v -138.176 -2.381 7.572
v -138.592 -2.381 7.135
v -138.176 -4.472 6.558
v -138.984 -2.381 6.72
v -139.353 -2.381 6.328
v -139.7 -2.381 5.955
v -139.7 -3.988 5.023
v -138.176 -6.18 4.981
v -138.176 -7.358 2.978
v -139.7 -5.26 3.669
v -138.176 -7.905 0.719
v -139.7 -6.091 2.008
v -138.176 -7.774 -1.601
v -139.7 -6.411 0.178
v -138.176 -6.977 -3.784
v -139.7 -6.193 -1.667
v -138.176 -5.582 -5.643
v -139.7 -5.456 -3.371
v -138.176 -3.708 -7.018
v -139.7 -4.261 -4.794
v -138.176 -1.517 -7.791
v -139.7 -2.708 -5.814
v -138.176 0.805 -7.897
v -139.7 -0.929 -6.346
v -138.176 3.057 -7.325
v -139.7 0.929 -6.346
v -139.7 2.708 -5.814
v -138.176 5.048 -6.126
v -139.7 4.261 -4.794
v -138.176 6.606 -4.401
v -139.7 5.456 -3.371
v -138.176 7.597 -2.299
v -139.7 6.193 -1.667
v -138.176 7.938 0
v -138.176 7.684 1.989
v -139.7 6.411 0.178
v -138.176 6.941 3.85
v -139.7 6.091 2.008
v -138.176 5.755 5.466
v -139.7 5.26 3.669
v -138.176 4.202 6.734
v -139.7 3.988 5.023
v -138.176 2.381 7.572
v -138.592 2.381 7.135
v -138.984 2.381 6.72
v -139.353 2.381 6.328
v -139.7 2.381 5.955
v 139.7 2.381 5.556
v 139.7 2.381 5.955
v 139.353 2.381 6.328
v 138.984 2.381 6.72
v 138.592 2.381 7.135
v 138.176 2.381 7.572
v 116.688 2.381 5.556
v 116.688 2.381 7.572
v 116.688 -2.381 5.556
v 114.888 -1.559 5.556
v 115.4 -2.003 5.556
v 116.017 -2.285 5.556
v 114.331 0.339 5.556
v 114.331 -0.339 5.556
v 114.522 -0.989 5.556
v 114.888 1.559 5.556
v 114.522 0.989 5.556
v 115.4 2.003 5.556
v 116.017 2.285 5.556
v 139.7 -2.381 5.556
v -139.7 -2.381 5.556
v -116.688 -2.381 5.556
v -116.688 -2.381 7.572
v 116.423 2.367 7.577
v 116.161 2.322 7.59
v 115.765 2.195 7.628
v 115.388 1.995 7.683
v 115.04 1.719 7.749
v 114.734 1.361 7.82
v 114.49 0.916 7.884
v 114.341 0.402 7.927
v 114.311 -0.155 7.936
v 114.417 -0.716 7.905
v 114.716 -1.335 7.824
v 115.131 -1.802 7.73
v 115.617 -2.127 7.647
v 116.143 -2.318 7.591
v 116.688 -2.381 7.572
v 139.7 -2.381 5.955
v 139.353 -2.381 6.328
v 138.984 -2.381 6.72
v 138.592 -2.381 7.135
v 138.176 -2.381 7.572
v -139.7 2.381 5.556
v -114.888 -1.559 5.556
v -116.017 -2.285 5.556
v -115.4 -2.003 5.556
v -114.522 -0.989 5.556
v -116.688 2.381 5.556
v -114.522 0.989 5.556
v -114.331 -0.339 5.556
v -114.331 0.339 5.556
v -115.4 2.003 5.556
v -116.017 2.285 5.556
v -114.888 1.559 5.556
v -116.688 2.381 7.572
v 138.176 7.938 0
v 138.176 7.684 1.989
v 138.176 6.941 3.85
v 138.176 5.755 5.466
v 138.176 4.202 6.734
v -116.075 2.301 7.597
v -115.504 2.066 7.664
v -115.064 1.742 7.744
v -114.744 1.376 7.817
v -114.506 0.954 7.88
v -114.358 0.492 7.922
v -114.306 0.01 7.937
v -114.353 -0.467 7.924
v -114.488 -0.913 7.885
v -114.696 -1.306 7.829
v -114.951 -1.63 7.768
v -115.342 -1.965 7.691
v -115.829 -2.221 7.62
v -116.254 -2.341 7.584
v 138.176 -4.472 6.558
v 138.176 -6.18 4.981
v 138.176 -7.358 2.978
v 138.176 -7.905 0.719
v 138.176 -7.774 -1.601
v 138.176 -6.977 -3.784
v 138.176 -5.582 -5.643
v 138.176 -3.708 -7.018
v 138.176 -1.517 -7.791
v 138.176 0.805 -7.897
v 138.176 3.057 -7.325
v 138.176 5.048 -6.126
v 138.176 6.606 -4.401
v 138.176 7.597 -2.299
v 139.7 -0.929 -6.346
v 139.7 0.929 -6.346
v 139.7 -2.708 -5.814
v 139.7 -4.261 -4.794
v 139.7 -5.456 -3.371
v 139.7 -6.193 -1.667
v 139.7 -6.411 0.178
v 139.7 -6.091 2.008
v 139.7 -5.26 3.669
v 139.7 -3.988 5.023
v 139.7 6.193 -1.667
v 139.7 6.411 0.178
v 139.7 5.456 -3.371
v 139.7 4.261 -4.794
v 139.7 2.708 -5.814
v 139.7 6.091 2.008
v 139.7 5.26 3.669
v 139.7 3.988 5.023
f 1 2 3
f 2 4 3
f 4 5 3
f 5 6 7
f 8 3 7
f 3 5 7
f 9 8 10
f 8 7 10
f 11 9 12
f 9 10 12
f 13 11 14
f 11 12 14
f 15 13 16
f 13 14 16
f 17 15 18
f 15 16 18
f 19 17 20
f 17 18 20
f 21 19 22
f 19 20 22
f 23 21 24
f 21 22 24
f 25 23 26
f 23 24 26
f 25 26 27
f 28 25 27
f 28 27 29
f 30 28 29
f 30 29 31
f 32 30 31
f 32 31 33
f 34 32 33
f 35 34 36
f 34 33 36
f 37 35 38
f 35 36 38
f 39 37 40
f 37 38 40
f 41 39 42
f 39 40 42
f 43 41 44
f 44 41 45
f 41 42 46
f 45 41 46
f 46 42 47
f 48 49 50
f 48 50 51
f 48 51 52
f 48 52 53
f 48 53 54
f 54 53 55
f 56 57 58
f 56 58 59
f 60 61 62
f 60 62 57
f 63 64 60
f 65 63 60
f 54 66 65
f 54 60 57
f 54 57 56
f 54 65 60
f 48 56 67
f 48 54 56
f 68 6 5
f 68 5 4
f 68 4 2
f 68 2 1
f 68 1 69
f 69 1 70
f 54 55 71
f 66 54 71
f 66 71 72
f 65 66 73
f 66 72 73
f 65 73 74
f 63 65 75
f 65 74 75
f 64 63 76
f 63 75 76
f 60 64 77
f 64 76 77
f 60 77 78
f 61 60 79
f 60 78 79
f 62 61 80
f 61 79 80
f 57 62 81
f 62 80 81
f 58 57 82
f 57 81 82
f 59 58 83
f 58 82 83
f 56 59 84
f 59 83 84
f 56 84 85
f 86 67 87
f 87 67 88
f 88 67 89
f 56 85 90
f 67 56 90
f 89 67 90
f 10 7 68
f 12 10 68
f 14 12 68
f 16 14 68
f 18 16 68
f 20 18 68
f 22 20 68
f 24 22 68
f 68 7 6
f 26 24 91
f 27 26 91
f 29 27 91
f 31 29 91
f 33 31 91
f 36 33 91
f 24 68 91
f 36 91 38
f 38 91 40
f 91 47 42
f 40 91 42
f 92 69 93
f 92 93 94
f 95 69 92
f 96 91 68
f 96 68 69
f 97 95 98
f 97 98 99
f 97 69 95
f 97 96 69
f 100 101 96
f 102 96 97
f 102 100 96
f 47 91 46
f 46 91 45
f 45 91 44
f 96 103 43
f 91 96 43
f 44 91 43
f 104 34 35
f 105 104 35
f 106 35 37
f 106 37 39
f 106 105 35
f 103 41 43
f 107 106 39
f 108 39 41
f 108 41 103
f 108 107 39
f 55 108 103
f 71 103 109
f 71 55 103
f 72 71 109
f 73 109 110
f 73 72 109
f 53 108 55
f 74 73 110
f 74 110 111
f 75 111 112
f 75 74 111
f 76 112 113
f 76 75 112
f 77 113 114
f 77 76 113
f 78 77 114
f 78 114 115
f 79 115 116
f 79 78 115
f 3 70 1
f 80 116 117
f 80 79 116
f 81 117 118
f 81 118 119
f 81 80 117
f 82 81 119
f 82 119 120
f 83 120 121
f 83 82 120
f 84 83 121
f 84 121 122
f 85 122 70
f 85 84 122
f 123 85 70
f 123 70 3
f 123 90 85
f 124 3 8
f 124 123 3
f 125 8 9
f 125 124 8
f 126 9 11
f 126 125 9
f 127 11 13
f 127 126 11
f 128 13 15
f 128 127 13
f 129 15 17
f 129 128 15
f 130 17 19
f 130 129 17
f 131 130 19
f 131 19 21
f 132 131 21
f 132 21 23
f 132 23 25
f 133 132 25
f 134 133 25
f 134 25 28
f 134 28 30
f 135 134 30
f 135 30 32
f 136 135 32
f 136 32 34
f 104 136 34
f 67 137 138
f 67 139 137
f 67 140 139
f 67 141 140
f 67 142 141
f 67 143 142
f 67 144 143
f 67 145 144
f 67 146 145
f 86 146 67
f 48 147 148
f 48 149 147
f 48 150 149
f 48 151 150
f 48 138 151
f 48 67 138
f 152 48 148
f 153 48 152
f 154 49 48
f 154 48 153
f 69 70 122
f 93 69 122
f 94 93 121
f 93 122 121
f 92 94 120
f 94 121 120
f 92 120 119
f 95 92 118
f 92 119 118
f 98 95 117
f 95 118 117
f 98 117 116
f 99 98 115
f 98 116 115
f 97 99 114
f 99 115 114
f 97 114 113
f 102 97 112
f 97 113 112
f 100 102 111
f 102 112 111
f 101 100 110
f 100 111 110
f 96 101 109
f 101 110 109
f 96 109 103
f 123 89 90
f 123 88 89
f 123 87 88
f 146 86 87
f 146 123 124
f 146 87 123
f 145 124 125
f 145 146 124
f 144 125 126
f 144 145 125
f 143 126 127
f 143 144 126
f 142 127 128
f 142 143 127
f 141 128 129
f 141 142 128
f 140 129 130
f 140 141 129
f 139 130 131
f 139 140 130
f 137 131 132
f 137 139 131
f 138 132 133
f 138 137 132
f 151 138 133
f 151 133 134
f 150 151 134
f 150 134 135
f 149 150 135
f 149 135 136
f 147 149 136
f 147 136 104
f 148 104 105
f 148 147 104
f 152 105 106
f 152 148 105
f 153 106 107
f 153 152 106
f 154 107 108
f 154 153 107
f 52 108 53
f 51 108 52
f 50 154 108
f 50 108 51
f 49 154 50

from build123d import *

# Parameters (mm, degrees)
F0_R     = 7.9375
F1_DEPTH = 139.7
F4_DEPTH = 2.38125
F5_SIZE  = 1.524


with BuildPart() as f1:
    # F0 (on Right) → F1 (new body, symmetric)
    with BuildSketch(Plane.YZ):
        Circle(F0_R)
    extrude(amount=F1_DEPTH, both=True)

    # F3 (on offset) → F4 (cut)
    with BuildSketch(Plane.XY.offset(7.9375)):
        with BuildLine():
            ThreePointArc((-116.6876, -2.38125), (-115.0038019773, -1.6837980227), (-114.30635, 0))
            ThreePointArc((-114.30635, 0), (-115.0038019773, 1.6837980227), (-116.6876, 2.38125))
            ThreePointArc((-116.6876, 2.38125), (-119.06885, 0), (-116.6876, -2.38125))
        make_face()
        with BuildLine():
            ThreePointArc((-116.6876, -2.38125), (-119.06885, 0), (-116.6876, 2.38125))
            Line((-116.6876, 2.38125), (-139.7, 2.38125))
            Line((-139.7, 2.38125), (-139.7, -2.38125))
            Line((-139.7, -2.38125), (-116.6876, -2.38125))
        make_face()
        with BuildLine():
            ThreePointArc((116.6876, -2.38125), (118.3713980227, -1.6837980227), (119.06885, 0))
            ThreePointArc((119.06885, 0), (118.3713980227, 1.6837980227), (116.6876, 2.38125))
            Line((116.6876, 2.38125), (116.6876, -2.38125))
        make_face()
        with BuildLine():
            ThreePointArc((116.6876, 2.38125), (118.3713980227, 1.6837980227), (119.06885, 0))
            ThreePointArc((119.06885, 0), (118.3713980227, -1.6837980227), (116.6876, -2.38125))
            Line((116.6876, -2.38125), (139.7, -2.38125))
            Line((139.7, -2.38125), (139.7, 2.38125))
            Line((139.7, 2.38125), (116.6876, 2.38125))
        make_face()
        with BuildLine():
            Line((116.6876, -2.38125), (116.6876, 2.38125))
            ThreePointArc((116.6876, 2.38125), (114.30635, 0), (116.6876, -2.38125))
        make_face()
    extrude(amount=-F4_DEPTH, mode=Mode.SUBTRACT)

    # F5
    f5_edges = [f1.edges().sort_by_distance(p)[0] for p in [
        (-139.7, -4.695888, -6.399417),
        (139.7, -4.695888, -6.399417),
    ]]
    chamfer(f5_edges, length=F5_SIZE)


solid = f1.part
